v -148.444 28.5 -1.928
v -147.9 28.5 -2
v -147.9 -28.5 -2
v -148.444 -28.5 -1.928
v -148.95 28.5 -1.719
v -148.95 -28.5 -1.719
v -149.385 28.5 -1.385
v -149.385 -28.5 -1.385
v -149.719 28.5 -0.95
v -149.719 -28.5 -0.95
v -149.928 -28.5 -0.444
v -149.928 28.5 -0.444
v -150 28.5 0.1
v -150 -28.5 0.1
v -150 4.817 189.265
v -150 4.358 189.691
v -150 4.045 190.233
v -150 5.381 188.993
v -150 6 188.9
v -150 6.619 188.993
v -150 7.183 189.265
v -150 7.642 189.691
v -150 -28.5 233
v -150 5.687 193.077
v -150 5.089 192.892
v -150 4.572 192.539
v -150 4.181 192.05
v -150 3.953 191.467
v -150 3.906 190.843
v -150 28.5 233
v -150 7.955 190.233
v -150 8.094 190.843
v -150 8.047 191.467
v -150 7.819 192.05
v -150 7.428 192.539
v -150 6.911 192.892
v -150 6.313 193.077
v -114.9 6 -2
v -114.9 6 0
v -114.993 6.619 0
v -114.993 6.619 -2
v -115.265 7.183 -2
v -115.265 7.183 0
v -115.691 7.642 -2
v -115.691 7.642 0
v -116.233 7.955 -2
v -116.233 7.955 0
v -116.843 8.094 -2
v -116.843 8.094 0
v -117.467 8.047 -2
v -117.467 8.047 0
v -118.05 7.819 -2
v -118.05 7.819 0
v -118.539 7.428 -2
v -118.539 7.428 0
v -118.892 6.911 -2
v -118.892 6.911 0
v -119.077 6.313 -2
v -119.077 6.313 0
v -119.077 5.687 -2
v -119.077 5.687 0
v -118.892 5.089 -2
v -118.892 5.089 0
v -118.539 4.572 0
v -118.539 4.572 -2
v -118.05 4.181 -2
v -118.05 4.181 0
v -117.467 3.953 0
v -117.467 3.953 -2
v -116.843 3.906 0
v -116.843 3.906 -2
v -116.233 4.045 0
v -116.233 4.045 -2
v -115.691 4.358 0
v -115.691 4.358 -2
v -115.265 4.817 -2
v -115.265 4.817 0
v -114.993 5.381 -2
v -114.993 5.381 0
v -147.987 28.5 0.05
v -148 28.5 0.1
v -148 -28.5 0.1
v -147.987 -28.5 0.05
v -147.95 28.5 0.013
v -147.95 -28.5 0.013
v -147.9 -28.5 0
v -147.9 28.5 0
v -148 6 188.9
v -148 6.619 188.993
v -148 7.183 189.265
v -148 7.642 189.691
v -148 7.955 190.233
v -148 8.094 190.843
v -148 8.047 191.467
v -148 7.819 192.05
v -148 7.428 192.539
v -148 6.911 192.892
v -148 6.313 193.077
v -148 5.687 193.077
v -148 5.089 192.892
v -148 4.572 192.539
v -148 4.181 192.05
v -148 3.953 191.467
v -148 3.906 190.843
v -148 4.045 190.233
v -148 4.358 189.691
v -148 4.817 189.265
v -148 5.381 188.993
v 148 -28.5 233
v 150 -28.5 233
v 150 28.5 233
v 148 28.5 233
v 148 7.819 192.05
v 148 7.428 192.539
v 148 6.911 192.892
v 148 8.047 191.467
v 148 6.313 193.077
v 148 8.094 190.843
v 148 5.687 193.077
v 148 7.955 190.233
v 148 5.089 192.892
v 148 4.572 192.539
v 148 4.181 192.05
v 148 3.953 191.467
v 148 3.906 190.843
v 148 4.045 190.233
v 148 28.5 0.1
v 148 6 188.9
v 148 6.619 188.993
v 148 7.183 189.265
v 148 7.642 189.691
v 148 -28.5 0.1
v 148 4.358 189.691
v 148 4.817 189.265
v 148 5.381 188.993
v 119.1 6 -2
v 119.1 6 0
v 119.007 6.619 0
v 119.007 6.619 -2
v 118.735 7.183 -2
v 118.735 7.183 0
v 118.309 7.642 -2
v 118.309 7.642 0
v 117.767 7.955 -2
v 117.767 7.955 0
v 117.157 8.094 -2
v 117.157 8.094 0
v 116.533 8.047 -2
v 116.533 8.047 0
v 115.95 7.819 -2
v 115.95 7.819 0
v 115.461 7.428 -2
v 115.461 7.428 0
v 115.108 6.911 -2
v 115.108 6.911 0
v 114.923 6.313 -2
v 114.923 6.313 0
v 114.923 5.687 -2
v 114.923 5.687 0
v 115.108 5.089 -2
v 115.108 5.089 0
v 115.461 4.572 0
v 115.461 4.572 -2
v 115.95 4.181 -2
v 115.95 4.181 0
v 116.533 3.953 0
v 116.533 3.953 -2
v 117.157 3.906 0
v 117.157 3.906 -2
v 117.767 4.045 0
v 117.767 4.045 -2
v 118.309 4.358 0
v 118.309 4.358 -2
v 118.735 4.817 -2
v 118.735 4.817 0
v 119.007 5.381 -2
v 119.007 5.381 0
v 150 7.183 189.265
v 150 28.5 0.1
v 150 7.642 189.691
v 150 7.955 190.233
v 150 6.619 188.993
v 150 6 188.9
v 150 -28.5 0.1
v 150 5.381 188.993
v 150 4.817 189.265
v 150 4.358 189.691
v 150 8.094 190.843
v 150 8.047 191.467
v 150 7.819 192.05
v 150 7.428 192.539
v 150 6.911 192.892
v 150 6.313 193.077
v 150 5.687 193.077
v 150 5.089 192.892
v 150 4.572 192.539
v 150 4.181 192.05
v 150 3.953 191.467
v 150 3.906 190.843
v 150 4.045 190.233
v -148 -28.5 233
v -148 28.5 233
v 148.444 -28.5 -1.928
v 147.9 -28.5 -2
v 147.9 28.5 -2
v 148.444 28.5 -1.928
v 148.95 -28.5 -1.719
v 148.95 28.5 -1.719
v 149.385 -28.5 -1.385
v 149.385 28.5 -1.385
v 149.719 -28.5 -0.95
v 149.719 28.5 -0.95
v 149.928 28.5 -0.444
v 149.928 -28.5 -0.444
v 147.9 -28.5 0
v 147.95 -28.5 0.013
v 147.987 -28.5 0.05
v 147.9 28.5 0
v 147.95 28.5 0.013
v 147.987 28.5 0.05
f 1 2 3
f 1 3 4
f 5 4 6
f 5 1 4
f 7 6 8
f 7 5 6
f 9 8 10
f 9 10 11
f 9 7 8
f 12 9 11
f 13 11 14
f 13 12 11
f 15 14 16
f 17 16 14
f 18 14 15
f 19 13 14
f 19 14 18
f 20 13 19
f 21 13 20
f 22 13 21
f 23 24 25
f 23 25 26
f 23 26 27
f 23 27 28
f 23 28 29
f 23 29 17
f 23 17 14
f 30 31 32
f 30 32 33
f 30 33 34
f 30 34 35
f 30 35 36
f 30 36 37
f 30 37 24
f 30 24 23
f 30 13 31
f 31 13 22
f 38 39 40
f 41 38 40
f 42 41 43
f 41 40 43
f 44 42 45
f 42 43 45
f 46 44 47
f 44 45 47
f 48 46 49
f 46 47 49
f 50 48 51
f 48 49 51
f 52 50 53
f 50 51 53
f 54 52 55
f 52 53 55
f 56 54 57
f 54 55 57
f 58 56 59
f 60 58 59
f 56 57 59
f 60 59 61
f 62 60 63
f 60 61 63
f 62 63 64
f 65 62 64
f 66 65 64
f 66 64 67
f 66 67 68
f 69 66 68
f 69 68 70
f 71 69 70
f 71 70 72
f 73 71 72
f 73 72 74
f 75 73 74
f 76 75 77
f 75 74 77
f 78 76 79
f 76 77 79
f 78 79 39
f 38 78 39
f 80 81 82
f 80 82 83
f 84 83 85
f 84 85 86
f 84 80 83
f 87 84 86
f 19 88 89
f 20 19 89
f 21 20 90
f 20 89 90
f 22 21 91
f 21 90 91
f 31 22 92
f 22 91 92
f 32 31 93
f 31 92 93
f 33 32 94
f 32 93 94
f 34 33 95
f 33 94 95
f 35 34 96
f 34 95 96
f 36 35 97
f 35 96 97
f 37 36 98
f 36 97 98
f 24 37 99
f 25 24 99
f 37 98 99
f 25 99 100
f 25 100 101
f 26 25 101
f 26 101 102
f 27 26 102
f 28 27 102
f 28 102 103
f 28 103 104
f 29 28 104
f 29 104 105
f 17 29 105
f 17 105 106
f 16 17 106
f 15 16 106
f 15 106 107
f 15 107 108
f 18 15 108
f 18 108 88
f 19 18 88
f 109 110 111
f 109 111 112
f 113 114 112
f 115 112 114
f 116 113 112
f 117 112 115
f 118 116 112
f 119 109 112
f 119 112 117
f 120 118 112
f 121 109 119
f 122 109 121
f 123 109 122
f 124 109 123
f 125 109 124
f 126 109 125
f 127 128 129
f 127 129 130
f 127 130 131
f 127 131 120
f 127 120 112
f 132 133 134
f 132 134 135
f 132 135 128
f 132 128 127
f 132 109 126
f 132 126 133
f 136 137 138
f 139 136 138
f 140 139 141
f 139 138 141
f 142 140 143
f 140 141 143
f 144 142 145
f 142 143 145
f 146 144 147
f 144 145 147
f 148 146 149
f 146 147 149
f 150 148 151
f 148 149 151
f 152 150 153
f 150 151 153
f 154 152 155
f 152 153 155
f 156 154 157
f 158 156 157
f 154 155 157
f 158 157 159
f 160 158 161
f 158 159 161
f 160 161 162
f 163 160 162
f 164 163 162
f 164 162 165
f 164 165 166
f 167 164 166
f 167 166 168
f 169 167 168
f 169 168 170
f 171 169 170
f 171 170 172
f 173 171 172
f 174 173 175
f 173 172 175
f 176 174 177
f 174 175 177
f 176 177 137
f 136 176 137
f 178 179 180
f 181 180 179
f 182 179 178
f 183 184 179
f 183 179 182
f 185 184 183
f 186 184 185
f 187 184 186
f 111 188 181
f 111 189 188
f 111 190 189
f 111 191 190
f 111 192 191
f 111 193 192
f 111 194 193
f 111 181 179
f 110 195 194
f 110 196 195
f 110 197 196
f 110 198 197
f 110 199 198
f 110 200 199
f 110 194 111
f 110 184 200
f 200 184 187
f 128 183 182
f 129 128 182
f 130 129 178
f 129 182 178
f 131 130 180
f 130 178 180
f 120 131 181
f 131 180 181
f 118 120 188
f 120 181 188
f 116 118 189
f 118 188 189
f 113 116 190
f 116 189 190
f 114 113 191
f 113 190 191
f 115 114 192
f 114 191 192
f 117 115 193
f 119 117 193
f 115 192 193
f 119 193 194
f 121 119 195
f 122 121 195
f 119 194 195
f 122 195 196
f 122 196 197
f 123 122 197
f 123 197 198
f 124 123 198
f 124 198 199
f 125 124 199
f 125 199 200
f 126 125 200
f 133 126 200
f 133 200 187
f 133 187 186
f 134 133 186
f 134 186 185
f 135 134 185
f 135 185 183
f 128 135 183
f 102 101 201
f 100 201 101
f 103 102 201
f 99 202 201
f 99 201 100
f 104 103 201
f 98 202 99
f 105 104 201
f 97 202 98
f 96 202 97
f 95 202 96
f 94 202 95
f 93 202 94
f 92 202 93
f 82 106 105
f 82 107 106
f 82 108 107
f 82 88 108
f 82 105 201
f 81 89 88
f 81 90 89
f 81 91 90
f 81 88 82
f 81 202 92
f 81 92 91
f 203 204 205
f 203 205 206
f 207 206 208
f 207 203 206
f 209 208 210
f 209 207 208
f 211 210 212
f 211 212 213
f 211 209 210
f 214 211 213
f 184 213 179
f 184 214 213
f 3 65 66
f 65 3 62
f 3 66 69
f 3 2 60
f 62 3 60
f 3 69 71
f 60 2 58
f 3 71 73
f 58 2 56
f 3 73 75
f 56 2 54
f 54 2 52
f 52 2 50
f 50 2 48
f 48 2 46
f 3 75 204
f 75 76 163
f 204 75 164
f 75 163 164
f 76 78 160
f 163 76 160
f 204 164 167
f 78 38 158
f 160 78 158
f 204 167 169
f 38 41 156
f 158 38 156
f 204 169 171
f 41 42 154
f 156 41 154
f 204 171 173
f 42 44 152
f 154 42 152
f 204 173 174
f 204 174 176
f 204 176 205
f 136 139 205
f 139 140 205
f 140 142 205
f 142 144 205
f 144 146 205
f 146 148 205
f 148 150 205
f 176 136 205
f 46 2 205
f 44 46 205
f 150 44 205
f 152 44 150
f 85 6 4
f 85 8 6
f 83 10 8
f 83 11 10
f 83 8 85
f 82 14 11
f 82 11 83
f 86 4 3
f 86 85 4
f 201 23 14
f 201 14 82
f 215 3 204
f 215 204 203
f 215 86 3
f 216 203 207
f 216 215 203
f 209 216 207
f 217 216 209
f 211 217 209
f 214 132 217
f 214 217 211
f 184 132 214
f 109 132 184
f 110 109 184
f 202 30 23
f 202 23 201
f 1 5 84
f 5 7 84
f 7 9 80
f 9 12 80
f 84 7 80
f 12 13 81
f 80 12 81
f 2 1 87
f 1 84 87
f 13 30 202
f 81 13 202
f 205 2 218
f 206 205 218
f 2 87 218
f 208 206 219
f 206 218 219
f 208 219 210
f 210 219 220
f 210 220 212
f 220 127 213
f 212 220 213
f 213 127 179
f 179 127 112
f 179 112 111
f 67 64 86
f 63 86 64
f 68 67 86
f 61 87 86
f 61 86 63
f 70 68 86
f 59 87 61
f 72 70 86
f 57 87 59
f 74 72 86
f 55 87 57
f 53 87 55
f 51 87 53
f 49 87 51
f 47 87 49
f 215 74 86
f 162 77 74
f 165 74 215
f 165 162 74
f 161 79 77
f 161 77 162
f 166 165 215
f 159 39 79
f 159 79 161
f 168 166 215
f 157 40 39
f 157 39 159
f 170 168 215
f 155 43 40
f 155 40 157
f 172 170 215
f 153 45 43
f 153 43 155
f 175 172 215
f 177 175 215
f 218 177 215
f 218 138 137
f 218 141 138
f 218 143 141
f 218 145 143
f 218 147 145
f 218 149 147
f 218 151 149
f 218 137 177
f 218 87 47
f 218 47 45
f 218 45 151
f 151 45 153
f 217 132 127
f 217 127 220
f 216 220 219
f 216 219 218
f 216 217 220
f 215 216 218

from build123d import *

# Parameters (mm, degrees)
SKIZZE1_W                       = 300
SKIZZE1_H                       = 57
SKIZZE1_R                       = 2.1
BASIS_BLECH1_DEPTH              = 2
KANTE_LASCHE1_STRIP_W           = 8.2
KANTE_LASCHE1_STRIP_H           = 2
KANTE_LASCHE1_STRIP_CUT_DEPTH   = 57
KANTE_LASCHE1_STRIP_2_W         = 8.2
KANTE_LASCHE1_STRIP_2_H         = 2
KANTE_LASCHE1_STRIP_CUT_2_DEPTH = 57
KANTE_LASCHE1_DEPTH             = 57
KANTE_LASCHE1_BEND_DEPTH        = 57
SKIZZE10_R                      = 2.1
SCHNITT_LINEAR_AUSTRAGEN1_DEPTH = 381.921579856


# Sheet-metal steps are written as plain solids
with BuildPart() as part:
    # Skizze1 → Basis-Blech1 (new body)
    with BuildSketch(Plane.XY):
        Rectangle(SKIZZE1_W, SKIZZE1_H)
        with Locations((-117, 6)):
            Circle(SKIZZE1_R, mode=Mode.SUBTRACT)
        with Locations((117, 6)):
            Circle(SKIZZE1_R, mode=Mode.SUBTRACT)
    extrude(amount=-BASIS_BLECH1_DEPTH)

    # Kante-Lasche1 strip (across the edge) → Kante-Lasche1 strip cut (cut)
    with BuildSketch(Plane(origin=(-150, 28.5, 0), x_dir=(1, 0, 0), z_dir=(0, -1, 0))):
        with Locations((-2, -1)):
            Rectangle(KANTE_LASCHE1_STRIP_W, KANTE_LASCHE1_STRIP_H)
    extrude(amount=KANTE_LASCHE1_STRIP_CUT_DEPTH, mode=Mode.SUBTRACT)

    # Kante-Lasche1 strip 2 (across the edge) → Kante-Lasche1 strip cut 2 (cut)
    with BuildSketch(Plane(origin=(150, -28.5, 0), x_dir=(-1, 0, 0), z_dir=(0, 1, 0))):
        with Locations((-2, -1)):
            Rectangle(KANTE_LASCHE1_STRIP_2_W, KANTE_LASCHE1_STRIP_2_H)
    extrude(amount=KANTE_LASCHE1_STRIP_CUT_2_DEPTH, mode=Mode.SUBTRACT)

    # Kante-Lasche1 section (across the edge) → Kante-Lasche1 (add)
    with BuildSketch(Plane(origin=(-150, 28.5, 0), x_dir=(1, 0, 0), z_dir=(0, -1, 0))):
        with BuildLine():
            Line((0, 0.1), (0, 233))
            Line((0, 233), (2, 233))
            Line((2, 233), (2, 0.1))
            ThreePointArc((2, 0.1), (2.029289322, 0.029289322), (2.1, 0))
            Line((2.1, 0), (2.1, -2))
            ThreePointArc((2.1, -2), (0.61507576, -1.38492424), (0, 0.1))
        make_face()
    extrude(amount=KANTE_LASCHE1_DEPTH)

    # Kante-Lasche1 section 2 (across the edge) → Kante-Lasche1 bend (add)
    with BuildSketch(Plane(origin=(150, -28.5, 0), x_dir=(-1, 0, 0), z_dir=(0, 1, 0))):
        with BuildLine():
            Line((0, 0.1), (0, 233))
            Line((0, 233), (2, 233))
            Line((2, 233), (2, 0.1))
            ThreePointArc((2, 0.1), (2.029289322, 0.029289322), (2.1, 0))
            Line((2.1, 0), (2.1, -2))
            ThreePointArc((2.1, -2), (0.61507576, -1.38492424), (0, 0.1))
        make_face()
    extrude(amount=KANTE_LASCHE1_BEND_DEPTH)

    # Skizze10 → Schnitt-Linear austragen1 (cut, through all)
    with BuildSketch(Plane(origin=(150, 0, 0), x_dir=(0, 0, -1), z_dir=(1, 0, 0))):
        with Locations((-191, 6)):
            Circle(SKIZZE10_R)
    extrude(amount=-SCHNITT_LINEAR_AUSTRAGEN1_DEPTH, mode=Mode.SUBTRACT)


solid = part.part
